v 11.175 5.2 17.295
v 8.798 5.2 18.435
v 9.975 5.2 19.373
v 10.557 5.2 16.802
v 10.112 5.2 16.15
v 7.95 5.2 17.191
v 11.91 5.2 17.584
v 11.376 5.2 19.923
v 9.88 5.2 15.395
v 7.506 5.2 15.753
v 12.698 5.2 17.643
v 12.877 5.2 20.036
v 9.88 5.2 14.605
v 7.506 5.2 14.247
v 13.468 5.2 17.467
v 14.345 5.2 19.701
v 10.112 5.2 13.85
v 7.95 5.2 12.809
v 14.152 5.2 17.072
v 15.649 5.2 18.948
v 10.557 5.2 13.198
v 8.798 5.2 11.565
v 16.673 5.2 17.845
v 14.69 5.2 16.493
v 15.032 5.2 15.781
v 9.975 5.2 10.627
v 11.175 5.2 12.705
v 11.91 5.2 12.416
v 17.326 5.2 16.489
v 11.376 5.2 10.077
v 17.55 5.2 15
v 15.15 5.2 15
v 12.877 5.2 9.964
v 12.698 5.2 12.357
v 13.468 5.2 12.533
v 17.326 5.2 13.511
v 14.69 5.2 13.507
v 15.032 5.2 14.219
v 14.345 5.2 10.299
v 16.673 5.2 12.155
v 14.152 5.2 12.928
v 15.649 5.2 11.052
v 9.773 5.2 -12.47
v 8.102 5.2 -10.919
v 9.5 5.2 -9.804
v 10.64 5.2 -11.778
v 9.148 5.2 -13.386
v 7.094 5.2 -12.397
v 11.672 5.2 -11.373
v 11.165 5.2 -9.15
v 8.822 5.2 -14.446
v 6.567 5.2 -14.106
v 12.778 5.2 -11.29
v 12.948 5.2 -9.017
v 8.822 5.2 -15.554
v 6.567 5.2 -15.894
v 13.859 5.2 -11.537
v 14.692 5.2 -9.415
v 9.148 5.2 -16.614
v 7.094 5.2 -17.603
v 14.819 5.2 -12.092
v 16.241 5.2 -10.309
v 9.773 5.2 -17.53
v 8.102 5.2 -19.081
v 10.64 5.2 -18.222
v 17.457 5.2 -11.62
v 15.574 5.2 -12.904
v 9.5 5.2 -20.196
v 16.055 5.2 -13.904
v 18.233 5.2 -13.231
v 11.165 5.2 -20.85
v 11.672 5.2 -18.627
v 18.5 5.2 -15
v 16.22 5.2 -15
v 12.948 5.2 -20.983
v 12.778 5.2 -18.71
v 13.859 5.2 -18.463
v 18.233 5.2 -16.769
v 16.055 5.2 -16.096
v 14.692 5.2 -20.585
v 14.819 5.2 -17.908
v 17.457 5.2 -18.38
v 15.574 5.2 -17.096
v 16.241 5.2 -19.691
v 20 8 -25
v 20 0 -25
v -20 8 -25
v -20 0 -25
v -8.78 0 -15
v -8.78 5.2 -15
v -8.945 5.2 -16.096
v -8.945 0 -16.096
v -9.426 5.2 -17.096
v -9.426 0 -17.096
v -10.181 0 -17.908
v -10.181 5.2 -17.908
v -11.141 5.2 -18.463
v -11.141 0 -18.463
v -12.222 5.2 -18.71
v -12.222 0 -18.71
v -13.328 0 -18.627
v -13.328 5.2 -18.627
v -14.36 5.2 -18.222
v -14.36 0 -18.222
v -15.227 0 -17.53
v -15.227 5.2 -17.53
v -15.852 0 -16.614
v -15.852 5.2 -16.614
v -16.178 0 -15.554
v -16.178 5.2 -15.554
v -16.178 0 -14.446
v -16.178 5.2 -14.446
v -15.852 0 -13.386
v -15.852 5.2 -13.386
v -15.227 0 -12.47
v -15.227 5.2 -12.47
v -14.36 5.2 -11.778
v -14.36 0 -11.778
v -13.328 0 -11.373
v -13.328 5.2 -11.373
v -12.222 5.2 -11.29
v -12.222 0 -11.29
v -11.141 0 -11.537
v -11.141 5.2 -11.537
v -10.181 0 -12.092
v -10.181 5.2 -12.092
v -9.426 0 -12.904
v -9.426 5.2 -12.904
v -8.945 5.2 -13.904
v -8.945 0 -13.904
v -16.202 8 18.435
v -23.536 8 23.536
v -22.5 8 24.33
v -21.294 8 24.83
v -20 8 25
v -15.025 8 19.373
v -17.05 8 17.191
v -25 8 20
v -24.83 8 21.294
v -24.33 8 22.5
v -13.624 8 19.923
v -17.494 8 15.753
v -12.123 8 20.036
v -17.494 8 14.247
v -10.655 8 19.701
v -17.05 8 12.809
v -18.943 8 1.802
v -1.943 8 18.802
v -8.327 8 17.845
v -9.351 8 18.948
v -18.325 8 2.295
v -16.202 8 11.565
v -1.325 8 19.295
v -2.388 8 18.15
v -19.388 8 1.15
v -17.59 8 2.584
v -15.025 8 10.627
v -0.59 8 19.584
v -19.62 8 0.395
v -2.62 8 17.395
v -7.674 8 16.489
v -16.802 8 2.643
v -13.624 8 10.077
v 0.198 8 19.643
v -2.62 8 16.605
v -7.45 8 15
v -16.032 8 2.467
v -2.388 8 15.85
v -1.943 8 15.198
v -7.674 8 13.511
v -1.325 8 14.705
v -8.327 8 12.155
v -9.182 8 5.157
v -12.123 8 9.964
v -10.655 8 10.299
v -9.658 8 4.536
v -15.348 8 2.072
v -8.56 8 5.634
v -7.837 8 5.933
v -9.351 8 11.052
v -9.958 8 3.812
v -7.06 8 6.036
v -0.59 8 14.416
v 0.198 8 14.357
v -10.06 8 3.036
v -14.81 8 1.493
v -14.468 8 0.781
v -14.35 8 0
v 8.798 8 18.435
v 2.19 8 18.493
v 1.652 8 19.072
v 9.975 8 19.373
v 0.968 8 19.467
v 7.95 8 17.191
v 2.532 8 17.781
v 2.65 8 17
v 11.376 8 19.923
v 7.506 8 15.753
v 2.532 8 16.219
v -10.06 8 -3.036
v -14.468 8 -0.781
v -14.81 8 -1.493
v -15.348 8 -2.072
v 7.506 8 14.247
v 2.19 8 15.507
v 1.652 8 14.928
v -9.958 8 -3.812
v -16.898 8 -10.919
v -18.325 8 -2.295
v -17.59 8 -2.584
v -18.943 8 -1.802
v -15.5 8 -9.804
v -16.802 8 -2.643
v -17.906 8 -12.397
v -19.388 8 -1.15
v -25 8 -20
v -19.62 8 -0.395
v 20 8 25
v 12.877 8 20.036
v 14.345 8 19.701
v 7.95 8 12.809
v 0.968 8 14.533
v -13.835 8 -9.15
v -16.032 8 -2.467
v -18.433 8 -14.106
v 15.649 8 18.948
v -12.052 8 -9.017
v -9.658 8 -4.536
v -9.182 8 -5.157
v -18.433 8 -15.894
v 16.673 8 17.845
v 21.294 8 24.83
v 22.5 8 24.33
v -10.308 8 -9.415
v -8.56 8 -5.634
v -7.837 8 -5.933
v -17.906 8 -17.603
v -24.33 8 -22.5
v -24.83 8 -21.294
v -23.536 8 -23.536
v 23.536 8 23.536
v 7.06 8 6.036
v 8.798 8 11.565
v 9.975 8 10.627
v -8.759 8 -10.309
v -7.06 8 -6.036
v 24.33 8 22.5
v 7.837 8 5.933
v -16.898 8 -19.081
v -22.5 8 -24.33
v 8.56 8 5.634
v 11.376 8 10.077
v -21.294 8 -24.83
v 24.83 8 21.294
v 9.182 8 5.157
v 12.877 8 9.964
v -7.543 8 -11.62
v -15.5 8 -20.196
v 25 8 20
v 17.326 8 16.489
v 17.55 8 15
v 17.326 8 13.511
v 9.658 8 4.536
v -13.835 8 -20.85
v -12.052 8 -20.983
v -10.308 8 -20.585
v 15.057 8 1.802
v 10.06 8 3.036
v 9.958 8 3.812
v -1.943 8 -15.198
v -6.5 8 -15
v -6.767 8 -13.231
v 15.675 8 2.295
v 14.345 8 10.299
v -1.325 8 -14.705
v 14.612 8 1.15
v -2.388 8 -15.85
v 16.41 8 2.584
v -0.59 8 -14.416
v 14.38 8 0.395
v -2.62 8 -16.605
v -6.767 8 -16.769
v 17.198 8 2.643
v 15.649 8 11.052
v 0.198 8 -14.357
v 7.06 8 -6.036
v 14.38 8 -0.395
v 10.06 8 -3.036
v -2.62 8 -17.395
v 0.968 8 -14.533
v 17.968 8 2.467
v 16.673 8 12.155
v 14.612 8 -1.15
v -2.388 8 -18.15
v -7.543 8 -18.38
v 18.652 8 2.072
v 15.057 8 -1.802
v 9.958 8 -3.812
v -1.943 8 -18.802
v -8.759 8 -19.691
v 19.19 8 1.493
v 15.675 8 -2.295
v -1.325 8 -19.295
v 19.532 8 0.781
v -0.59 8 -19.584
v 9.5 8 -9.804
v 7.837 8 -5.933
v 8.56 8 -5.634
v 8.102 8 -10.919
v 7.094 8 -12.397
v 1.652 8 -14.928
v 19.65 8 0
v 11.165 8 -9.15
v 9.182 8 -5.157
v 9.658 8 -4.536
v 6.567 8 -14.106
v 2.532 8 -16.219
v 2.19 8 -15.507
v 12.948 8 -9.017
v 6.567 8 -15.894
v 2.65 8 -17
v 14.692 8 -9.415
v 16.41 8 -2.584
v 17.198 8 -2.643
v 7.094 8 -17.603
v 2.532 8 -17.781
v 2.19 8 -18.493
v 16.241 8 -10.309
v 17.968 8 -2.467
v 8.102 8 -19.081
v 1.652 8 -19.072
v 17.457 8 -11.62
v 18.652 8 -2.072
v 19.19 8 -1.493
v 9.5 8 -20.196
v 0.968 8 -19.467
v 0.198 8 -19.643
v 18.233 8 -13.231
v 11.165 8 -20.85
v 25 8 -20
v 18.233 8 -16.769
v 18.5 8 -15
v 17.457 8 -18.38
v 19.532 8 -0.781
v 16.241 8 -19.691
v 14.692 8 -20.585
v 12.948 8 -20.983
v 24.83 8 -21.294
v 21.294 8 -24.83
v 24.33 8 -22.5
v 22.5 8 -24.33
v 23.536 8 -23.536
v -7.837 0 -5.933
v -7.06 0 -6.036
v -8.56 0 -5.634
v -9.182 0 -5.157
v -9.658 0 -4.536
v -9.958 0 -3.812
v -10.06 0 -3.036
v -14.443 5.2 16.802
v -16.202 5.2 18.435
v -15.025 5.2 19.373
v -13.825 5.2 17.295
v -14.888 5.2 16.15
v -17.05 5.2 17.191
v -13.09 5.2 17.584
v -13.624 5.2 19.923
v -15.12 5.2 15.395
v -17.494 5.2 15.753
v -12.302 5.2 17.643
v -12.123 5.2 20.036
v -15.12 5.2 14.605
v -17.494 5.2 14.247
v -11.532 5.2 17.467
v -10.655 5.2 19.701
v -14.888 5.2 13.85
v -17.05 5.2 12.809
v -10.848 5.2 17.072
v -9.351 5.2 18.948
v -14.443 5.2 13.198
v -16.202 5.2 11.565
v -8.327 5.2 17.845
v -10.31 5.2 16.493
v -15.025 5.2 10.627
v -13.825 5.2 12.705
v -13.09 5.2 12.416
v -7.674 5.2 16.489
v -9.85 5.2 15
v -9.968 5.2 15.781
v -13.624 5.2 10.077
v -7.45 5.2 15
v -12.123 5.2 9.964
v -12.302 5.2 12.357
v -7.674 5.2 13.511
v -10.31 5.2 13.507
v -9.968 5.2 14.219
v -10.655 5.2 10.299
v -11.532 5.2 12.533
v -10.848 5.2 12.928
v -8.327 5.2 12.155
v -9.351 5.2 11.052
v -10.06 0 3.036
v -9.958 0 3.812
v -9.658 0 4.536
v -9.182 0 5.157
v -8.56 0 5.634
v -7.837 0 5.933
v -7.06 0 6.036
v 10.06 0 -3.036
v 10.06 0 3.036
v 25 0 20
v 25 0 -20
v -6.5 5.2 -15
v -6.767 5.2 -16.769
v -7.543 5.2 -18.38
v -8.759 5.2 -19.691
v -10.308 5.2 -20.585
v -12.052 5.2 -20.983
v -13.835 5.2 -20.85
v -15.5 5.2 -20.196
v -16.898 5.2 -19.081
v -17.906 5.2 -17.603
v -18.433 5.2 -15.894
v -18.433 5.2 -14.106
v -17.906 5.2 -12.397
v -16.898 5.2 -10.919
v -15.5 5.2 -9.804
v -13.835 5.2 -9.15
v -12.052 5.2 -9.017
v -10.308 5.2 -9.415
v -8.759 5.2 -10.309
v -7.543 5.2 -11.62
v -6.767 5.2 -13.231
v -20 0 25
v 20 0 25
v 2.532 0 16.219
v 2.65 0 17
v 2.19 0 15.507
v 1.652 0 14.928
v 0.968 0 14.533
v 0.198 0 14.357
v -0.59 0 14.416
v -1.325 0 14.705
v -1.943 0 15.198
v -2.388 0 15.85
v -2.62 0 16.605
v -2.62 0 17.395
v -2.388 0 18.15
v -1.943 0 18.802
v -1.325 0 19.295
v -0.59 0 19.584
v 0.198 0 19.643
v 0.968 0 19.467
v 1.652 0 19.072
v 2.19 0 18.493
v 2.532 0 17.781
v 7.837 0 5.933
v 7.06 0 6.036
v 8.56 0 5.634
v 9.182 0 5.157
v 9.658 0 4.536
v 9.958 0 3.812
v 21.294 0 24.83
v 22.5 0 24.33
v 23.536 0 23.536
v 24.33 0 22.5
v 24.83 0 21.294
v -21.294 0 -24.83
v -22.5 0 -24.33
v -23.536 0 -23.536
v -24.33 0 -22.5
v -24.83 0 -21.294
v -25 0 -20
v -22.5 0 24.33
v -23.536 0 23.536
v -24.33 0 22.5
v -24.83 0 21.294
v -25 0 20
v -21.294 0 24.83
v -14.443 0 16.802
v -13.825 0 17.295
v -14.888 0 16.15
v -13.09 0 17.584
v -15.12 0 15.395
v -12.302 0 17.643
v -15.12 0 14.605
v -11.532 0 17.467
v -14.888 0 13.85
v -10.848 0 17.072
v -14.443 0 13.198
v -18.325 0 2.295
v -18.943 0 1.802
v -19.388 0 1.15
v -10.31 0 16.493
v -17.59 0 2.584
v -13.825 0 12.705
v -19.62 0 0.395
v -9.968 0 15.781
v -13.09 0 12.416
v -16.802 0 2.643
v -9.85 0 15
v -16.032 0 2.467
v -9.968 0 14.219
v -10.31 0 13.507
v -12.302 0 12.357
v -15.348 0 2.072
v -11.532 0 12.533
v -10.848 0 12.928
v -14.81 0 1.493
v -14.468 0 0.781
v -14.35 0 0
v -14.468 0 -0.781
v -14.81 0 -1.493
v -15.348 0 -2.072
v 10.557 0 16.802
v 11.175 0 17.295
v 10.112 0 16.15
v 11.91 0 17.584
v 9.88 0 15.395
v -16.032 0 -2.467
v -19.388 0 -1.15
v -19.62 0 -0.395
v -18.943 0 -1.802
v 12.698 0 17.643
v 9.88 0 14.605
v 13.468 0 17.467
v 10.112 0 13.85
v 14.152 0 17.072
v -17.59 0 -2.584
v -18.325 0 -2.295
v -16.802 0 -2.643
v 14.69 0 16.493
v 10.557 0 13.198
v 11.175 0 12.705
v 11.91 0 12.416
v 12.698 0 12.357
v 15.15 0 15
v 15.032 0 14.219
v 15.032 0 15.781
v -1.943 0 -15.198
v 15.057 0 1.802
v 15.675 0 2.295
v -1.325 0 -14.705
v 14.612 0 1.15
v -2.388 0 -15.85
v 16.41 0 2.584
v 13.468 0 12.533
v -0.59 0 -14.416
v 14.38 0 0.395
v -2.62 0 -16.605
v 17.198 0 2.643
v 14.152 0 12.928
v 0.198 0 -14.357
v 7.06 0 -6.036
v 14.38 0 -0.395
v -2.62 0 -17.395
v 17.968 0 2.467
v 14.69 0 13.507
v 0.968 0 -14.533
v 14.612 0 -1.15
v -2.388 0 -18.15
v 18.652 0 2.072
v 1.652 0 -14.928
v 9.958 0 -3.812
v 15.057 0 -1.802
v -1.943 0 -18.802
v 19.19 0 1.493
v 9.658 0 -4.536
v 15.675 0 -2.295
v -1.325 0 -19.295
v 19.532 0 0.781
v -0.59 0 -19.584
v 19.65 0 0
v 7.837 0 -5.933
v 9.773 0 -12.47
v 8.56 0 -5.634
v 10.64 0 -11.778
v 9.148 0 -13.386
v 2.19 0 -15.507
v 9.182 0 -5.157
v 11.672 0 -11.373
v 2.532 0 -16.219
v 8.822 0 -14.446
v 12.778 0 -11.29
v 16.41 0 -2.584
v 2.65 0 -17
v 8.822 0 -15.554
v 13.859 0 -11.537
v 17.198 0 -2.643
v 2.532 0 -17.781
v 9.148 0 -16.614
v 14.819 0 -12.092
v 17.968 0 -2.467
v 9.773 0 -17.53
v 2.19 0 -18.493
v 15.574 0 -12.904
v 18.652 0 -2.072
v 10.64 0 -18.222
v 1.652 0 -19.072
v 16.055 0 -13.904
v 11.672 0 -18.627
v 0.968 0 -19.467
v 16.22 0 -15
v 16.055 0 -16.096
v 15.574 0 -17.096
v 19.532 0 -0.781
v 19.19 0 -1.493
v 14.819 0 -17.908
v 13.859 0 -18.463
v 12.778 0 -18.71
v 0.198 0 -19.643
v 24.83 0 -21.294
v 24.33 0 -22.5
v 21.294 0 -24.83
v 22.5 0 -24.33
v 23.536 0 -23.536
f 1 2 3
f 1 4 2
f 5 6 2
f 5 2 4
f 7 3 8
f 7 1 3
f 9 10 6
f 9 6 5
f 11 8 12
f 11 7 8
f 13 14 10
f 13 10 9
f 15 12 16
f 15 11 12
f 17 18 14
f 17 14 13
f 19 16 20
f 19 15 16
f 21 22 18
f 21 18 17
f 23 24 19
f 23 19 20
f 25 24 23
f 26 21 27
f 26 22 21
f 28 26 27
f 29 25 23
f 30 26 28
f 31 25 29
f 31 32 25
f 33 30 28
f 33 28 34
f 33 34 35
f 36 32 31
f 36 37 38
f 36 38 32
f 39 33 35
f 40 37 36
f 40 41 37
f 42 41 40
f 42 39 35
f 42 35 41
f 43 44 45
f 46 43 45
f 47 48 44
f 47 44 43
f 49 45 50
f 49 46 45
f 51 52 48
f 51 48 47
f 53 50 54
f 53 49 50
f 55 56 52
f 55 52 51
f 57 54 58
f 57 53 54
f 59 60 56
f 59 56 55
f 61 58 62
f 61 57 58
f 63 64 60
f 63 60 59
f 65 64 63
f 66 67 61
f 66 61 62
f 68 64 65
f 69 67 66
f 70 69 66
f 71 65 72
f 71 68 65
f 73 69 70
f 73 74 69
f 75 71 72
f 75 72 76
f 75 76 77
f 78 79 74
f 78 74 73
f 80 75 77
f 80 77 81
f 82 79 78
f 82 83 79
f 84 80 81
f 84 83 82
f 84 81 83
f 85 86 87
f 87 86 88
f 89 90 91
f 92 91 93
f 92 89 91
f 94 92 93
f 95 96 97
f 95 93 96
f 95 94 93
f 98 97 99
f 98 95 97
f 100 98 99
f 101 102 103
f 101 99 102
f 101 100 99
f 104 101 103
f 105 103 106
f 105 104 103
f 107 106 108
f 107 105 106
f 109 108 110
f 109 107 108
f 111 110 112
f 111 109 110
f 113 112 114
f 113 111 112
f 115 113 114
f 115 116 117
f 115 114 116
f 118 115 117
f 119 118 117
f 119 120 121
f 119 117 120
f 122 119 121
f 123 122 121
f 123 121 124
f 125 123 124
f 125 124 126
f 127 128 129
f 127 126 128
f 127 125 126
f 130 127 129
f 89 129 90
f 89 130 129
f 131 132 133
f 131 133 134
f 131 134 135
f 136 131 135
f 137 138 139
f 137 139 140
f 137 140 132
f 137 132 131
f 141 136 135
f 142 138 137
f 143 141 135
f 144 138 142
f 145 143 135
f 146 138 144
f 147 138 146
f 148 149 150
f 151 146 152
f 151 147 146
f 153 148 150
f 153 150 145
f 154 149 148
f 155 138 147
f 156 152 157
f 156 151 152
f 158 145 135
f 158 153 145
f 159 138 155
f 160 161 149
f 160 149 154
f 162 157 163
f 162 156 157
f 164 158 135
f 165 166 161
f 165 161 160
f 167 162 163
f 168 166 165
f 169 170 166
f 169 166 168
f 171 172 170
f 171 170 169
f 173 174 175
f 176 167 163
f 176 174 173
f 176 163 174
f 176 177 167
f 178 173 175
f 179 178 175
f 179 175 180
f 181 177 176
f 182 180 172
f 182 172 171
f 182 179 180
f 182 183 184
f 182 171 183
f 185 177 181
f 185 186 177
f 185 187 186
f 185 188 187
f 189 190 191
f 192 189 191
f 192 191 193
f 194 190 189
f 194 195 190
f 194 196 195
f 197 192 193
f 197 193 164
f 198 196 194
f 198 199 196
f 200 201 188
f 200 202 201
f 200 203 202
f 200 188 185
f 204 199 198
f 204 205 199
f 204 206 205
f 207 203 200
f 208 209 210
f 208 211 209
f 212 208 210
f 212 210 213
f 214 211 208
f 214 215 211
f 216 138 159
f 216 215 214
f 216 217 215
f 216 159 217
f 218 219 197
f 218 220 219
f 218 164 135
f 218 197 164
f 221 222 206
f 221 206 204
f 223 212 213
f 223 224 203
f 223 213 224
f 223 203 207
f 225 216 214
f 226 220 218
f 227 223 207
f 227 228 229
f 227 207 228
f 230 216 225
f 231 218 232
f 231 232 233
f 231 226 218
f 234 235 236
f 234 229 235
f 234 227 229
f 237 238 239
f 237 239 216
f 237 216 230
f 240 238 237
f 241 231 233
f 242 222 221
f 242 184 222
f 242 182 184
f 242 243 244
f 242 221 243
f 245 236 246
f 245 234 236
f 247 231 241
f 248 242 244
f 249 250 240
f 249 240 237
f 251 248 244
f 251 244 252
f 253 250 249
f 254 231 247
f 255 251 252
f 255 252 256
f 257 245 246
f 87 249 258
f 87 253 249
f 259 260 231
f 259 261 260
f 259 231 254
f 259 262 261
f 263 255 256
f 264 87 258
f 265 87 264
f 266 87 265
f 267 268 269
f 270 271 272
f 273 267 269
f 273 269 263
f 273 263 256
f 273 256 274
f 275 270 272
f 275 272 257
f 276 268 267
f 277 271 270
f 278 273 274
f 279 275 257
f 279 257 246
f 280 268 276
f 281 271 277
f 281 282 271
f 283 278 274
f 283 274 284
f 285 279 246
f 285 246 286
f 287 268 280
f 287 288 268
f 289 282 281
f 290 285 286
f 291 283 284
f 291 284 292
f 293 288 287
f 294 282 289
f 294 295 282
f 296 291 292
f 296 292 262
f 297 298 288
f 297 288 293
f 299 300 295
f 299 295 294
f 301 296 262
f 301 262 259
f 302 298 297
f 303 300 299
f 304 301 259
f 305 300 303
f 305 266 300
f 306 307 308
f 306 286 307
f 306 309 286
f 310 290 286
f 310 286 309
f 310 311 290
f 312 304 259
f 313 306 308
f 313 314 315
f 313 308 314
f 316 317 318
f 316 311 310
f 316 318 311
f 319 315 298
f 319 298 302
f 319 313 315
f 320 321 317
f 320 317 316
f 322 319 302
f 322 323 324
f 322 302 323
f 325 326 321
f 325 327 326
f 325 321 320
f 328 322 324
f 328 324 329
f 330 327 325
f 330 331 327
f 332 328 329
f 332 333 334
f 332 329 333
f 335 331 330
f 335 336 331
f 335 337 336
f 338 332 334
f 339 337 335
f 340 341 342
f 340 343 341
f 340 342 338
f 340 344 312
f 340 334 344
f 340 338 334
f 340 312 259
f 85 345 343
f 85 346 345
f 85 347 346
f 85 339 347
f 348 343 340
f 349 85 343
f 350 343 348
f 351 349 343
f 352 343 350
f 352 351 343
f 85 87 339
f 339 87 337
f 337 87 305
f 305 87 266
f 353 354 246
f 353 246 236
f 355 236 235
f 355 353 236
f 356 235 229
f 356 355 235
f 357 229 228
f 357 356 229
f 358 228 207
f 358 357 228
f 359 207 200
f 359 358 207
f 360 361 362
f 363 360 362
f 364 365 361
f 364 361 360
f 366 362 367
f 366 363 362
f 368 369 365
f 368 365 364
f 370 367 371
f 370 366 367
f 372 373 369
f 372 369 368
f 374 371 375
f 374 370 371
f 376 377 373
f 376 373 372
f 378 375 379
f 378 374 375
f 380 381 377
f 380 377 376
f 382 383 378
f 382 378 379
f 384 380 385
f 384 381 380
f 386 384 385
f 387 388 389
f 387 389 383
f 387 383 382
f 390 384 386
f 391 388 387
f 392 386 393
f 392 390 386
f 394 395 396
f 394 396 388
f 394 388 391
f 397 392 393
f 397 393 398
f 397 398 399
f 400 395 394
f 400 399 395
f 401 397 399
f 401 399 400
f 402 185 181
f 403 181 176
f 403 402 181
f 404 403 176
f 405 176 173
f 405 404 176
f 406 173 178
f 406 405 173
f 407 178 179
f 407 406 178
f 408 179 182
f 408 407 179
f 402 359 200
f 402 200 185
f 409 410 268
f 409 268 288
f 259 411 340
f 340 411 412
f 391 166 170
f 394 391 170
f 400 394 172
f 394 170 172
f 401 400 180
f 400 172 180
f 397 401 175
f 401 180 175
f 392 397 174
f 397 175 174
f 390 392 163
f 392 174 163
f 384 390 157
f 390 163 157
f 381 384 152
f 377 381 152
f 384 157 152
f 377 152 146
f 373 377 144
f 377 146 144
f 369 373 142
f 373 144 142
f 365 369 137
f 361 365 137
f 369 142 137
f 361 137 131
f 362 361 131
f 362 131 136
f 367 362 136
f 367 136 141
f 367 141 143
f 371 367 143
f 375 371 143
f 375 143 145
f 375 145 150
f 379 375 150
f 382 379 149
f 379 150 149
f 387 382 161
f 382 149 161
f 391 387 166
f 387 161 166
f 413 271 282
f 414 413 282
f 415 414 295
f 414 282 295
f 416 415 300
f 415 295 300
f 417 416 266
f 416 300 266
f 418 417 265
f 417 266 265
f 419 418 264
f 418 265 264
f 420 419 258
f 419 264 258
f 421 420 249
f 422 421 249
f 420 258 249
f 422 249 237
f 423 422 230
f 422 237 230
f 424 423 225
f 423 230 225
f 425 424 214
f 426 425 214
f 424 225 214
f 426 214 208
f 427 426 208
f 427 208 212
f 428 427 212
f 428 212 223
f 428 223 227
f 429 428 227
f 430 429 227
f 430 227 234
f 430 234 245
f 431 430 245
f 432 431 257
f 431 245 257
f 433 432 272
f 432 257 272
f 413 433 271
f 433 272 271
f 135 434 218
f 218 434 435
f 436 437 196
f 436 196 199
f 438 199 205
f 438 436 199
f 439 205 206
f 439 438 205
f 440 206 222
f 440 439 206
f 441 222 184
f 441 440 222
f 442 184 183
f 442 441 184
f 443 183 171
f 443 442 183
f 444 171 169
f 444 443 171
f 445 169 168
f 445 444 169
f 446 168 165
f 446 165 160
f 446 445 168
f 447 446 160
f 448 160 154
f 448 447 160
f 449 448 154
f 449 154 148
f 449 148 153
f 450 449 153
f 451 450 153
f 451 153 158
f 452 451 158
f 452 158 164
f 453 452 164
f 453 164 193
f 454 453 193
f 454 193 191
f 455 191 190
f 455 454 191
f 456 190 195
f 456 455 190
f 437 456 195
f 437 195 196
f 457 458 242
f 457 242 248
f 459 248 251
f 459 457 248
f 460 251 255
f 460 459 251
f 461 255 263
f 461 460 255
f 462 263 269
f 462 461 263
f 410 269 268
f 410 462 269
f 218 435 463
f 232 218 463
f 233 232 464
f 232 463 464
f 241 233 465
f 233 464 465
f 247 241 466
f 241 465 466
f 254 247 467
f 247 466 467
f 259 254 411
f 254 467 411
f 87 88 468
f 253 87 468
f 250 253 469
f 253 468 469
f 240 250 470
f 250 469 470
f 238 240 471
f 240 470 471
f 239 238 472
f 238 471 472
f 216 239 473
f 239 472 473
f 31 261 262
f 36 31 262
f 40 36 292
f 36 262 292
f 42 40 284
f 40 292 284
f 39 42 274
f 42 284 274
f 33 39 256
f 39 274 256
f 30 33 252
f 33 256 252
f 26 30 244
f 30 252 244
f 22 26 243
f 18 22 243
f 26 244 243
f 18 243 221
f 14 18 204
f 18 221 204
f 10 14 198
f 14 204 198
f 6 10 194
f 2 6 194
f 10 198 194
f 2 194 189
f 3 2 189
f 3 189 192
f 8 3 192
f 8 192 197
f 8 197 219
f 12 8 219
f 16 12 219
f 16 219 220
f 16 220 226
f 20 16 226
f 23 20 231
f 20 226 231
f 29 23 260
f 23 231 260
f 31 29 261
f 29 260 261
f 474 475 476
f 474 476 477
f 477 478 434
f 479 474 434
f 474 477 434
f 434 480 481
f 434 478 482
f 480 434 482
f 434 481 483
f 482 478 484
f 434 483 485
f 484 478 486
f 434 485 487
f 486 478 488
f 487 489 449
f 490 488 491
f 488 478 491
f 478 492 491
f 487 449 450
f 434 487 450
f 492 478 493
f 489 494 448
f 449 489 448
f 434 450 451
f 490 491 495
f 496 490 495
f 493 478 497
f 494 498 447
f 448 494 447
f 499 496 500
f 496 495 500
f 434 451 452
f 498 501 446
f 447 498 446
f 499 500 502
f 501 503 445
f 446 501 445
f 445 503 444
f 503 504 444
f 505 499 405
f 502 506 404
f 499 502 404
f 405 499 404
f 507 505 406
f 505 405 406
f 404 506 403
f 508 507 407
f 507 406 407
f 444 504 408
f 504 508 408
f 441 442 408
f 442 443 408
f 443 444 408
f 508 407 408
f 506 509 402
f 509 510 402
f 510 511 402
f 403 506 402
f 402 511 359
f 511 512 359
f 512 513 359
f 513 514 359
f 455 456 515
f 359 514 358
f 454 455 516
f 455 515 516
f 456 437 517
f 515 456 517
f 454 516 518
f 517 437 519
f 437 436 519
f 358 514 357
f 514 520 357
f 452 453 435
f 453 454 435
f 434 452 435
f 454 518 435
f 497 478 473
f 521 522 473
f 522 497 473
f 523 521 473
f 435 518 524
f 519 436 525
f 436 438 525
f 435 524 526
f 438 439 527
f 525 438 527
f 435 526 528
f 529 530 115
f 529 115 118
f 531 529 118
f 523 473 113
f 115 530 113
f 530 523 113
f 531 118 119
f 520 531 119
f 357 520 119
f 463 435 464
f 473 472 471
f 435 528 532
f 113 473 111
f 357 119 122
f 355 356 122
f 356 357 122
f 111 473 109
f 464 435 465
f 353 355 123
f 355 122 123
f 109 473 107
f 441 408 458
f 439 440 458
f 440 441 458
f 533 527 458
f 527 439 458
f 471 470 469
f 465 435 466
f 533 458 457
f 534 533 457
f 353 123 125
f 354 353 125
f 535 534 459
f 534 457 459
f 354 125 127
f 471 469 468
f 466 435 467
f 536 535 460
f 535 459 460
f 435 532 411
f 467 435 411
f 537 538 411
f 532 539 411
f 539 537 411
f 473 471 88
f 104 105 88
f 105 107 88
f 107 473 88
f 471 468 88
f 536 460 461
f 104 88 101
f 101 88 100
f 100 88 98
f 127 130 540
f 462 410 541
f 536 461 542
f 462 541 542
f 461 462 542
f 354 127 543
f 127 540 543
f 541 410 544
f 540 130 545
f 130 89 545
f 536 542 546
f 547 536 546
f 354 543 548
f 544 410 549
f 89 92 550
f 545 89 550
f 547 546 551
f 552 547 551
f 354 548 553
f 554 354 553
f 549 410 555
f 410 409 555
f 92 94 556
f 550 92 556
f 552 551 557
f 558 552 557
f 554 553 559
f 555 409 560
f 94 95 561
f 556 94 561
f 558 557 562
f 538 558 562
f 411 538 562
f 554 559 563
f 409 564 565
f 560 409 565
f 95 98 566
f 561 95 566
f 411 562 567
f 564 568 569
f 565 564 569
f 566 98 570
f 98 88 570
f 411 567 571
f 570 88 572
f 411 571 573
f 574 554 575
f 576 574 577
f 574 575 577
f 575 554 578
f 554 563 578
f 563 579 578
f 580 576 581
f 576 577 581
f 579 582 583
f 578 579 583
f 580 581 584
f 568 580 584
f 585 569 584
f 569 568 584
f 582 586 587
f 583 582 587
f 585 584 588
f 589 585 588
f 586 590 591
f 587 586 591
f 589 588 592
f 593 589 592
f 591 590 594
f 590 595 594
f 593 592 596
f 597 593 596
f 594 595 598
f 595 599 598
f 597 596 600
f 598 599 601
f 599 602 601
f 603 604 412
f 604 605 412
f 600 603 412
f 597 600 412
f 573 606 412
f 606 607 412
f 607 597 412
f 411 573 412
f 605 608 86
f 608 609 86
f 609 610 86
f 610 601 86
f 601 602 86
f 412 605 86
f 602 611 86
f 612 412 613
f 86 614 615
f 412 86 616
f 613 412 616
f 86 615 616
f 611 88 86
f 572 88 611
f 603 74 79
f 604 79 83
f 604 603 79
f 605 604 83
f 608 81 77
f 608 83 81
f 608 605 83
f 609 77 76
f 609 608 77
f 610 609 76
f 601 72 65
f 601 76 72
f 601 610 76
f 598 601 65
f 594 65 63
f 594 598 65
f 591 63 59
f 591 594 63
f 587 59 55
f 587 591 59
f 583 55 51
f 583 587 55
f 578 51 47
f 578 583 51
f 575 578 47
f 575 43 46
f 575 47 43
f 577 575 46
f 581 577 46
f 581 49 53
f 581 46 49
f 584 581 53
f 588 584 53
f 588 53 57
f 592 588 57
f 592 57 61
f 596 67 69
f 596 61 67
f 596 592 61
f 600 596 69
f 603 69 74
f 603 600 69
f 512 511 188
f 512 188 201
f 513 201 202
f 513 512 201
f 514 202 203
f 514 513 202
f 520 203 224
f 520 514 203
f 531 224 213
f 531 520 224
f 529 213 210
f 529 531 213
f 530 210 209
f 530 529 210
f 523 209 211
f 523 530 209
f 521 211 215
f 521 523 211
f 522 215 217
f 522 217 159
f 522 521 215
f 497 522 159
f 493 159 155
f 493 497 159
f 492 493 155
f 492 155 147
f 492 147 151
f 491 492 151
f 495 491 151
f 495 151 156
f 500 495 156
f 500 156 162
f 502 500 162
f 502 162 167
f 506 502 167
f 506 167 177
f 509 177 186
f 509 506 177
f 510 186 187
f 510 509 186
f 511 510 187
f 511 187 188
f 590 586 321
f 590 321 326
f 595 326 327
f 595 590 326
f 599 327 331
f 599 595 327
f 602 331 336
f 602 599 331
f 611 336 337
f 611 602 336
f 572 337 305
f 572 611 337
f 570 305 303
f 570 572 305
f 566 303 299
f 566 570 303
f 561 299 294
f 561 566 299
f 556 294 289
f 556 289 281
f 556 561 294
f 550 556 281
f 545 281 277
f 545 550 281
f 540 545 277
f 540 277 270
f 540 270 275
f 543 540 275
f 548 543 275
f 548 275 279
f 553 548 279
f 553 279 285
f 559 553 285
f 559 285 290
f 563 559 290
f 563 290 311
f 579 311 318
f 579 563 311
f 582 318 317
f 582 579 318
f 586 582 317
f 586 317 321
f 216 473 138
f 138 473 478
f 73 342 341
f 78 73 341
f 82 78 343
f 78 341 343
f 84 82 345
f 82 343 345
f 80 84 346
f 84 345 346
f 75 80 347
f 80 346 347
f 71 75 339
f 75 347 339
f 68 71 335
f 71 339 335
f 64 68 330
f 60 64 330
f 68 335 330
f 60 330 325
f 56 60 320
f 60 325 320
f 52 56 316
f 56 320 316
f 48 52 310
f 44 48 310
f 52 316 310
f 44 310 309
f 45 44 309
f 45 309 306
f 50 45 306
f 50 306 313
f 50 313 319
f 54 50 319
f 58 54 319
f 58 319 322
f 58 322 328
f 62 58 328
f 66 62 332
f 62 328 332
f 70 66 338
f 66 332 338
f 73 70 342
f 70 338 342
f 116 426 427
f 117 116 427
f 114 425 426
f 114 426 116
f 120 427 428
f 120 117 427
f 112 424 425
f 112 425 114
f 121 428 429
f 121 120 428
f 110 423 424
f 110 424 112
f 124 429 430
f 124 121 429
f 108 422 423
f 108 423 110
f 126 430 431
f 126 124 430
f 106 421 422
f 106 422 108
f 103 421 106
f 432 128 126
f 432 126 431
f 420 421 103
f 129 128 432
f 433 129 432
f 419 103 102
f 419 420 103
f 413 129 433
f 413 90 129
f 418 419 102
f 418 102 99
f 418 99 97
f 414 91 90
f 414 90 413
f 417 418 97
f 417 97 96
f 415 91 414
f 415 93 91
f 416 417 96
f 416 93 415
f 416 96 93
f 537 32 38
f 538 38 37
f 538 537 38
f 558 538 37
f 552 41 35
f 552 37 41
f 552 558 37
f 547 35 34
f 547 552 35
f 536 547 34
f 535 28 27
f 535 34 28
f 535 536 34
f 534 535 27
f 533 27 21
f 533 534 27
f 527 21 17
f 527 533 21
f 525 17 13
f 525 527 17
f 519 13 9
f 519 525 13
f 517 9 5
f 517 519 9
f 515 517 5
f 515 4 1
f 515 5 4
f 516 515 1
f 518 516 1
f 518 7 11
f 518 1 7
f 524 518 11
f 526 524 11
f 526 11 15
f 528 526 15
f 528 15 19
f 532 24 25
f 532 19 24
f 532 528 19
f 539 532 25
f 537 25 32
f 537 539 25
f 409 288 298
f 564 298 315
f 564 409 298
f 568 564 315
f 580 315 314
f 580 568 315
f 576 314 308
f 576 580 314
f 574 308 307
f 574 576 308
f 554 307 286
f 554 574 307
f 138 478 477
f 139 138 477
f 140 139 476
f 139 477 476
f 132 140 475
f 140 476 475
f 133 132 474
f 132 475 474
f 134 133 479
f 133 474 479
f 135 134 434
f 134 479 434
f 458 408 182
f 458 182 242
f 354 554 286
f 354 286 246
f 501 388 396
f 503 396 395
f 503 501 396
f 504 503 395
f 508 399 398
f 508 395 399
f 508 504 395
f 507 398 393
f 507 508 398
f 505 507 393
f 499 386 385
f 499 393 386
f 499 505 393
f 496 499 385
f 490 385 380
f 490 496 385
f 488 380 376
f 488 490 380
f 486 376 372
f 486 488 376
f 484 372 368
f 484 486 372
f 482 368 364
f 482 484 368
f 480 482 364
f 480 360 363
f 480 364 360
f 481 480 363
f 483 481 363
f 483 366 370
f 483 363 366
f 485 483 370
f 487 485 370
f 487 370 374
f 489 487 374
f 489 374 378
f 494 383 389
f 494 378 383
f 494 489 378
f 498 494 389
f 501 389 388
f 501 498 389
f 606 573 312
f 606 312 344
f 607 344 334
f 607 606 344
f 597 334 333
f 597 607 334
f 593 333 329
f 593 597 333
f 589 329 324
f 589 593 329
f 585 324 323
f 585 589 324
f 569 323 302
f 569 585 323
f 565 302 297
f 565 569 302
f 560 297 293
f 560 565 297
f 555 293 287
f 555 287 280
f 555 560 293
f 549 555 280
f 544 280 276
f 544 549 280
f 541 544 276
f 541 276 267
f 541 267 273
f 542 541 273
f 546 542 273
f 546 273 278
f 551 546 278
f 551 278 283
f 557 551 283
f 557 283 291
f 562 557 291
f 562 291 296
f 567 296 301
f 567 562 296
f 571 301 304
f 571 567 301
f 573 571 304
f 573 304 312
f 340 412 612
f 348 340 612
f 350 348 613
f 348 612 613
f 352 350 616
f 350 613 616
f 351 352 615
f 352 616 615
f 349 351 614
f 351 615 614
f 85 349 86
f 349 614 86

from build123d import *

# Parameters (mm, degrees)
CROQUIS1_R              = 2.65
CROQUIS1_R_2            = 3.72
SALIENTE_EXTRUIR2_DEPTH = 8
CORTAR_EXTRUIR1_START   = 8
CROQUIS1_4_R            = 5.05
CROQUIS1_4_R_2          = 6
CORTAR_EXTRUIR1_DEPTH   = 2.8


with BuildPart() as part:
    # Croquis1 → Saliente-Extruir2 (new body)
    with BuildSketch(Plane(origin=(0, 0, 0), x_dir=(1, 0, 0), z_dir=(0, 1, 0))):
        with BuildLine():
            Line((-20, -25), (20, -25))
            ThreePointArc((20, -25), (23.535533906, -23.535533906), (25, -20))
            Line((25, -20), (25, 20))
            ThreePointArc((25, 20), (23.535533906, 23.535533906), (20, 25))
            Line((20, 25), (-20, 25))
            ThreePointArc((-20, 25), (-23.535533906, 23.535533906), (-25, 20))
            Line((-25, 20), (-25, -20))
            ThreePointArc((-25, -20), (-23.535533906, -23.535533906), (-20, -25))
        make_face()
        with Locations((-12.5, -15)):
            Circle(CROQUIS1_R, mode=Mode.SUBTRACT)
        with Locations((-12.5, 15)):
            Circle(CROQUIS1_R_2, mode=Mode.SUBTRACT)
        with Locations((0, -17)):
            Circle(CROQUIS1_R, mode=Mode.SUBTRACT)
        with Locations((-17, 0)):
            Circle(CROQUIS1_R, mode=Mode.SUBTRACT)
        with Locations((0, 17)):
            Circle(CROQUIS1_R, mode=Mode.SUBTRACT)
        with Locations((17, 0)):
            Circle(CROQUIS1_R, mode=Mode.SUBTRACT)
        with Locations((12.5, -15)):
            Circle(CROQUIS1_R, mode=Mode.SUBTRACT)
        with Locations((12.5, 15)):
            Circle(CROQUIS1_R_2, mode=Mode.SUBTRACT)
        with BuildLine():
            Line((-7.060224725, -6.03567091), (7.060224725, -6.03567091))
            ThreePointArc((7.060224725, -6.03567091), (9.181545068, -5.156991253), (10.060224725, -3.03567091))
            Line((10.060224725, -3.03567091), (10.060224725, 3.03567091))
            ThreePointArc((10.060224725, 3.03567091), (9.181545068, 5.156991253), (7.060224725, 6.03567091))
            Line((7.060224725, 6.03567091), (-7.060224725, 6.03567091))
            ThreePointArc((-7.060224725, 6.03567091), (-9.181545068, 5.156991253), (-10.060224725, 3.03567091))
            Line((-10.060224725, 3.03567091), (-10.060224725, -3.03567091))
            ThreePointArc((-10.060224725, -3.03567091), (-9.181545068, -5.156991253), (-7.060224725, -6.03567091))
        make_face(mode=Mode.SUBTRACT)
    extrude(amount=SALIENTE_EXTRUIR2_DEPTH)

    # Croquis1<4> → Cortar-Extruir1 (cut)
    with BuildSketch(Plane(origin=(0, 0, 0), x_dir=(1, 0, 0), z_dir=(0, 1, 0)).offset(CORTAR_EXTRUIR1_START)):
        with Locations((-12.5, -15)):
            Circle(CROQUIS1_4_R)
        with Locations((-12.5, 15)):
            Circle(CROQUIS1_4_R_2)
        with Locations((12.5, -15)):
            Circle(CROQUIS1_4_R)
        with Locations((12.5, 15)):
            Circle(CROQUIS1_4_R_2)
    extrude(amount=-CORTAR_EXTRUIR1_DEPTH, mode=Mode.SUBTRACT)


solid = part.part
